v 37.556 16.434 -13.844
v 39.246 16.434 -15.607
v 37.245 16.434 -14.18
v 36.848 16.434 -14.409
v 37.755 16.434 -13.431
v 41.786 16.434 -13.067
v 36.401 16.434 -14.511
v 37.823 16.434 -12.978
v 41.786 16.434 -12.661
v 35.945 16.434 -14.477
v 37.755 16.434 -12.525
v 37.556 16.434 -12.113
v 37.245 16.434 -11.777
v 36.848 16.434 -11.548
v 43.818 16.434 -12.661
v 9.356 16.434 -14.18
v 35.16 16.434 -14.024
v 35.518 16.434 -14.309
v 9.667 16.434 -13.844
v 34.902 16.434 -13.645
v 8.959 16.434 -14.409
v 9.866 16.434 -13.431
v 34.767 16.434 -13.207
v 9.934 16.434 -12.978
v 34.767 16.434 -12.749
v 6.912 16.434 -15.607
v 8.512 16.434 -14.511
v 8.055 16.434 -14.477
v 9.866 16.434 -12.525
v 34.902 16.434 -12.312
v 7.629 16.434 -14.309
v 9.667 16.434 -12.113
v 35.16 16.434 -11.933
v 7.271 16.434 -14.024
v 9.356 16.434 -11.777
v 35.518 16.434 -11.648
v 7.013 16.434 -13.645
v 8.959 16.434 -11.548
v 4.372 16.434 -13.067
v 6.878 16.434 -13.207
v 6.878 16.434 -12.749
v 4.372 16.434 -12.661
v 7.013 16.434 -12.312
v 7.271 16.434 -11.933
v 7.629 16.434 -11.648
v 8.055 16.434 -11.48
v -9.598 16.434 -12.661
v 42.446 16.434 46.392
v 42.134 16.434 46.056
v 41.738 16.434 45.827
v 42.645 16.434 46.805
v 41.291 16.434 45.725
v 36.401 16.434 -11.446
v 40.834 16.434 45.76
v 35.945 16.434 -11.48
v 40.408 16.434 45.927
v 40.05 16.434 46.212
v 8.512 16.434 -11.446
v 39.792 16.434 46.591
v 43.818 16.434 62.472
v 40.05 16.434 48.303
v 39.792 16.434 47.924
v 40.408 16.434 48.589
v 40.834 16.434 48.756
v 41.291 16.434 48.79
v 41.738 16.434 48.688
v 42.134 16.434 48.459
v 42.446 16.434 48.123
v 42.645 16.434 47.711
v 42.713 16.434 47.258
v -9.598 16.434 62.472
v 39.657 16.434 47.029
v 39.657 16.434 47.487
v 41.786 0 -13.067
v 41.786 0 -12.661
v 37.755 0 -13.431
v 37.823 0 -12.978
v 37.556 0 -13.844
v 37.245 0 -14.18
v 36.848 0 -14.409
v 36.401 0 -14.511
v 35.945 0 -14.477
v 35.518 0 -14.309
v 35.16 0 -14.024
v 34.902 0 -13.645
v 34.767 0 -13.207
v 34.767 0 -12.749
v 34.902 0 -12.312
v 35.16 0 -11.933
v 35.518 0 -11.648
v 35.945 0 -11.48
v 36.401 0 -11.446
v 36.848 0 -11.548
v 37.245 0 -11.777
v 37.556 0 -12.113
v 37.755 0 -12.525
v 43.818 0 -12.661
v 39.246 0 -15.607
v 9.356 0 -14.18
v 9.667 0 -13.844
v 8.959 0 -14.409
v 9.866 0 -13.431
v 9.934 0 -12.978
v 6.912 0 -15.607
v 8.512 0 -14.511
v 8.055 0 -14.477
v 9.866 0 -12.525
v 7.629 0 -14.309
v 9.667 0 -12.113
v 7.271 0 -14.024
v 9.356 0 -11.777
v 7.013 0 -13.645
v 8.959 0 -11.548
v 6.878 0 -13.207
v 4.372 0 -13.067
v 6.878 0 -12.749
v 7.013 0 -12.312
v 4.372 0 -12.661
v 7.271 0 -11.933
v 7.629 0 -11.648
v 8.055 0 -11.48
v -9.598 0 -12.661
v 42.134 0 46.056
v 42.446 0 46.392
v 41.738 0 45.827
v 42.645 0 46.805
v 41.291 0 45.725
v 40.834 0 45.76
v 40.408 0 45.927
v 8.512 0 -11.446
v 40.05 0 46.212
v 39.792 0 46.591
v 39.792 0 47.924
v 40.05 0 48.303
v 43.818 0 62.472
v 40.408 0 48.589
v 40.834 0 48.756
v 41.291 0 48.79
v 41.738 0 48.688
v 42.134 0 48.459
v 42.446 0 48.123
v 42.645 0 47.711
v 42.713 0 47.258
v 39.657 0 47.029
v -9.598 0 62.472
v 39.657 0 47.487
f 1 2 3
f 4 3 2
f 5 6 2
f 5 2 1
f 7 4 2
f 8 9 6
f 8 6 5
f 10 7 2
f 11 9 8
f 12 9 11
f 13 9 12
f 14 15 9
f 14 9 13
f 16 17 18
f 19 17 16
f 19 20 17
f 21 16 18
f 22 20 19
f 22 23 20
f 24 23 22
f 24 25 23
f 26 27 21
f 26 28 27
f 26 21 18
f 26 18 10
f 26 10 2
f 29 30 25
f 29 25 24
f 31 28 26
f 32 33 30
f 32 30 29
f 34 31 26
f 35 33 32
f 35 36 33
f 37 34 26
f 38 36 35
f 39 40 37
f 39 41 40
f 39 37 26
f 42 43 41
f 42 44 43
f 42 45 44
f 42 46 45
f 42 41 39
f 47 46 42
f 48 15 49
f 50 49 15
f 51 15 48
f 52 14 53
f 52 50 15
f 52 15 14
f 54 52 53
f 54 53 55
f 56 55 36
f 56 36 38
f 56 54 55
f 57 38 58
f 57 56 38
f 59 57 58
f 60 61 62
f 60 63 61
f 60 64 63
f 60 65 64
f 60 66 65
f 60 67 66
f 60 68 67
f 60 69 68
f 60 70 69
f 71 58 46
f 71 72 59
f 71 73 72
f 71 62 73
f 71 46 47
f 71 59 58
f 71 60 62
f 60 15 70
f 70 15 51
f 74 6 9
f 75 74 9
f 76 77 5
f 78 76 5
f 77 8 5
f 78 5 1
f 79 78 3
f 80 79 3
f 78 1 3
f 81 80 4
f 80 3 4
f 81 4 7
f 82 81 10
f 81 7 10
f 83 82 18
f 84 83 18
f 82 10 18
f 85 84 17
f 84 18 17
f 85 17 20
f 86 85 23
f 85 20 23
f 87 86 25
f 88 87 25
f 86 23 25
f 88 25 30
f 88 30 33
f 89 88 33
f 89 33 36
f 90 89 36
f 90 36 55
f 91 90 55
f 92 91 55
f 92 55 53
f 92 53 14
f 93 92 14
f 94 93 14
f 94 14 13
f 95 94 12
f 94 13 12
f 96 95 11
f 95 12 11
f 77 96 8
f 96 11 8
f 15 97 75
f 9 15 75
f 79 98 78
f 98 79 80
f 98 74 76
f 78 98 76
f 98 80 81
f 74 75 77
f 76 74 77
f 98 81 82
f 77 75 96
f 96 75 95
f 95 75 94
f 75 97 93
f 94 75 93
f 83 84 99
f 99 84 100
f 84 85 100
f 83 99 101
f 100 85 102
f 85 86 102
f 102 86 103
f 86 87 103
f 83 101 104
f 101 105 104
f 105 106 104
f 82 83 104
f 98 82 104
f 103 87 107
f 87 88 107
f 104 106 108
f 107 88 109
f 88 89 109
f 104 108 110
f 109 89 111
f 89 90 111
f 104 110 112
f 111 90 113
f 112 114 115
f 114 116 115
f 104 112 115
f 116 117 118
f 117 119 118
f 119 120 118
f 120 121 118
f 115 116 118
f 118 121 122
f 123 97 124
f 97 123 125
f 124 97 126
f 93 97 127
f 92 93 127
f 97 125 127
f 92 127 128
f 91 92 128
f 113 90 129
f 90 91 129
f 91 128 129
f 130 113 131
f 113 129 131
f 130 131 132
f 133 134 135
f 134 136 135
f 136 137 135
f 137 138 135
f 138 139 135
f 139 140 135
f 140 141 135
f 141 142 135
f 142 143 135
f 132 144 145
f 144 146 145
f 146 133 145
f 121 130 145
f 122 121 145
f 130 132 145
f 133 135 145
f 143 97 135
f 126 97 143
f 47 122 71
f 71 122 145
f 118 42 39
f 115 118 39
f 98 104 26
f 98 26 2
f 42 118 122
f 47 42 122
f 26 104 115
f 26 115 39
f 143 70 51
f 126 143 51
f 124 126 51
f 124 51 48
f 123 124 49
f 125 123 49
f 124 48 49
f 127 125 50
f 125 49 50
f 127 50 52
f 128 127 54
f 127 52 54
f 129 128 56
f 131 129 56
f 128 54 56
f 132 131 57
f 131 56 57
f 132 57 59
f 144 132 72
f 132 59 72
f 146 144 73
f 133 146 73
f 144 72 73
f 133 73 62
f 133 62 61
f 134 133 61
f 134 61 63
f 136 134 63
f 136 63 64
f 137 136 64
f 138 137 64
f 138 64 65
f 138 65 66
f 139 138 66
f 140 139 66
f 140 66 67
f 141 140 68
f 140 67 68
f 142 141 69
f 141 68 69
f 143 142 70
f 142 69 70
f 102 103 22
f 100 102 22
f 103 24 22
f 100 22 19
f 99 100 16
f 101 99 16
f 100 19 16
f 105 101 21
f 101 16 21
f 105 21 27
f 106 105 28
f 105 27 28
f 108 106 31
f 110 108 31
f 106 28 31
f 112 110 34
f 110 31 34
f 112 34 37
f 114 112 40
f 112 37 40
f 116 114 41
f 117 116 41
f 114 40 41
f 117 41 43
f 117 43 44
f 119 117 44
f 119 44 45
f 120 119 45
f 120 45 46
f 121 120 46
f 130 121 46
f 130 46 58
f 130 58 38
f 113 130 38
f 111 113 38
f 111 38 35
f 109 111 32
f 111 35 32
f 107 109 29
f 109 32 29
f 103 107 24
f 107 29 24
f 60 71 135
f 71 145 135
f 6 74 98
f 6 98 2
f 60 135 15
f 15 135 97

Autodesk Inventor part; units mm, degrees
ref_plane "YZ Plane" through (0, 0, 0) normal (1, 0, 0) x (0, 1, 0)
ref_plane "XZ Plane" through (0, 0, 0) normal (0, 1, 0) x (-1, 0, 0)
ref_plane "XY Plane" through (0, 0, 0) normal (0, 0, 1) x (1, 0, 0)
sketch "Sketch1" plane through (0, 0, 0) normal (0, 1, 0) x (-1, 0, 0)
  line L0 (9.5985, 62.4723) -> (-43.8177, 62.4723)
  line L1 (-43.8177, 62.4723) -> (-43.8177, -12.6609)
  line L2 (-43.8177, -12.6609) -> (9.5985, -12.6609)
  line L3 (9.5985, -12.6609) -> (9.5985, 62.4723)
  line L4 (-41.7857, -12.6609) -> (-4.3715, -12.6609)
  line L5 (-4.3715, -12.6609) -> (-4.3715, -15.6073)
  line L6 (-4.3715, -15.6073) -> (-41.7857, -15.6073)
  line L7 (-41.7857, -15.6073) -> (-41.7857, -12.6609)
  point P0 (0, 0)
  dimension "d0" = 75.1332
  dimension "d1" = 53.4162
  dimension "d2" = 37.4142
  dimension "d3" = 2.032
  dimension "d4" = 2.9464
extrude "Extrusion1" add sketch "Sketch1" along normal blind 16.4338
chamfer "Chamfer1" distance 2.54 angle 45 2 edges at (41.7857, 8.2169, -15.6073) (4.3715, 8.2169, -15.6073)
sketch "Sketch2" plane through (0, 16.4338, 0) normal (0, 1, 0) x (1, 0, 0)
  circle A0 centre (8.3974, 12.9784) radius 1.5367
  circle A1 centre (36.2866, 12.9784) radius 1.5367
  line L0 (39.2457, 15.6073) -> (6.9115, 15.6073) projected
  line L1 (43.8177, -62.4723) -> (43.8177, 12.6609) projected
  circle A2 centre (41.1761, -47.2577) radius 1.5367
  line L2 (-9.5985, -62.4723) -> (43.8177, -62.4723) projected
  line L3 (41.7857, 12.6609) -> (41.7857, 13.0673) projected
  line L4 (41.7857, 13.0673) -> (41.7857, 15.6073) construction
  line L5 (41.7857, 15.6073) -> (39.2457, 15.6073) construction
  line L6 (4.4039, 13.0673) -> (4.4039, 15.6073) construction
  line L7 (4.4039, 15.6073) -> (6.9115, 15.6073) construction
  line L8 (4.3715, 12.6609) -> (-9.5985, 12.6609) construction
  point P0 (0, 0)
  dimension "d10" = 3.0734
  dimension "d11" = 2.6289
  dimension "d12" = 3.0734
  dimension "d13" = 2.6289
  dimension "d14" = 7.5311
  dimension "d15" = 27.8892
  dimension "d16" = 15.2146
  dimension "d17" = 2.6416
  dimension "d18" = 3.0734
  dimension "d21" = 60.2361
  dimension "d22" = 4.8895
  dimension "d24" = 60.4342
  dimension "d25" = 75.1332
  dimension "d26" = 53.4162
  dimension "d27" = 2.032
  dimension "d29" = 2.9464
  dimension "d30" = 37.3818
  dimension "d31" = 2.9464
  dimension "d32" = 13.97
  dimension "d33" = 75.1332
extrude "Extrusion2" cut sketch "Sketch2" against normal blind 16.4338
equation "\"d13\" = d11"
equation "\"d18\" = d12"
properties part number "Arduino board with Sheild"
